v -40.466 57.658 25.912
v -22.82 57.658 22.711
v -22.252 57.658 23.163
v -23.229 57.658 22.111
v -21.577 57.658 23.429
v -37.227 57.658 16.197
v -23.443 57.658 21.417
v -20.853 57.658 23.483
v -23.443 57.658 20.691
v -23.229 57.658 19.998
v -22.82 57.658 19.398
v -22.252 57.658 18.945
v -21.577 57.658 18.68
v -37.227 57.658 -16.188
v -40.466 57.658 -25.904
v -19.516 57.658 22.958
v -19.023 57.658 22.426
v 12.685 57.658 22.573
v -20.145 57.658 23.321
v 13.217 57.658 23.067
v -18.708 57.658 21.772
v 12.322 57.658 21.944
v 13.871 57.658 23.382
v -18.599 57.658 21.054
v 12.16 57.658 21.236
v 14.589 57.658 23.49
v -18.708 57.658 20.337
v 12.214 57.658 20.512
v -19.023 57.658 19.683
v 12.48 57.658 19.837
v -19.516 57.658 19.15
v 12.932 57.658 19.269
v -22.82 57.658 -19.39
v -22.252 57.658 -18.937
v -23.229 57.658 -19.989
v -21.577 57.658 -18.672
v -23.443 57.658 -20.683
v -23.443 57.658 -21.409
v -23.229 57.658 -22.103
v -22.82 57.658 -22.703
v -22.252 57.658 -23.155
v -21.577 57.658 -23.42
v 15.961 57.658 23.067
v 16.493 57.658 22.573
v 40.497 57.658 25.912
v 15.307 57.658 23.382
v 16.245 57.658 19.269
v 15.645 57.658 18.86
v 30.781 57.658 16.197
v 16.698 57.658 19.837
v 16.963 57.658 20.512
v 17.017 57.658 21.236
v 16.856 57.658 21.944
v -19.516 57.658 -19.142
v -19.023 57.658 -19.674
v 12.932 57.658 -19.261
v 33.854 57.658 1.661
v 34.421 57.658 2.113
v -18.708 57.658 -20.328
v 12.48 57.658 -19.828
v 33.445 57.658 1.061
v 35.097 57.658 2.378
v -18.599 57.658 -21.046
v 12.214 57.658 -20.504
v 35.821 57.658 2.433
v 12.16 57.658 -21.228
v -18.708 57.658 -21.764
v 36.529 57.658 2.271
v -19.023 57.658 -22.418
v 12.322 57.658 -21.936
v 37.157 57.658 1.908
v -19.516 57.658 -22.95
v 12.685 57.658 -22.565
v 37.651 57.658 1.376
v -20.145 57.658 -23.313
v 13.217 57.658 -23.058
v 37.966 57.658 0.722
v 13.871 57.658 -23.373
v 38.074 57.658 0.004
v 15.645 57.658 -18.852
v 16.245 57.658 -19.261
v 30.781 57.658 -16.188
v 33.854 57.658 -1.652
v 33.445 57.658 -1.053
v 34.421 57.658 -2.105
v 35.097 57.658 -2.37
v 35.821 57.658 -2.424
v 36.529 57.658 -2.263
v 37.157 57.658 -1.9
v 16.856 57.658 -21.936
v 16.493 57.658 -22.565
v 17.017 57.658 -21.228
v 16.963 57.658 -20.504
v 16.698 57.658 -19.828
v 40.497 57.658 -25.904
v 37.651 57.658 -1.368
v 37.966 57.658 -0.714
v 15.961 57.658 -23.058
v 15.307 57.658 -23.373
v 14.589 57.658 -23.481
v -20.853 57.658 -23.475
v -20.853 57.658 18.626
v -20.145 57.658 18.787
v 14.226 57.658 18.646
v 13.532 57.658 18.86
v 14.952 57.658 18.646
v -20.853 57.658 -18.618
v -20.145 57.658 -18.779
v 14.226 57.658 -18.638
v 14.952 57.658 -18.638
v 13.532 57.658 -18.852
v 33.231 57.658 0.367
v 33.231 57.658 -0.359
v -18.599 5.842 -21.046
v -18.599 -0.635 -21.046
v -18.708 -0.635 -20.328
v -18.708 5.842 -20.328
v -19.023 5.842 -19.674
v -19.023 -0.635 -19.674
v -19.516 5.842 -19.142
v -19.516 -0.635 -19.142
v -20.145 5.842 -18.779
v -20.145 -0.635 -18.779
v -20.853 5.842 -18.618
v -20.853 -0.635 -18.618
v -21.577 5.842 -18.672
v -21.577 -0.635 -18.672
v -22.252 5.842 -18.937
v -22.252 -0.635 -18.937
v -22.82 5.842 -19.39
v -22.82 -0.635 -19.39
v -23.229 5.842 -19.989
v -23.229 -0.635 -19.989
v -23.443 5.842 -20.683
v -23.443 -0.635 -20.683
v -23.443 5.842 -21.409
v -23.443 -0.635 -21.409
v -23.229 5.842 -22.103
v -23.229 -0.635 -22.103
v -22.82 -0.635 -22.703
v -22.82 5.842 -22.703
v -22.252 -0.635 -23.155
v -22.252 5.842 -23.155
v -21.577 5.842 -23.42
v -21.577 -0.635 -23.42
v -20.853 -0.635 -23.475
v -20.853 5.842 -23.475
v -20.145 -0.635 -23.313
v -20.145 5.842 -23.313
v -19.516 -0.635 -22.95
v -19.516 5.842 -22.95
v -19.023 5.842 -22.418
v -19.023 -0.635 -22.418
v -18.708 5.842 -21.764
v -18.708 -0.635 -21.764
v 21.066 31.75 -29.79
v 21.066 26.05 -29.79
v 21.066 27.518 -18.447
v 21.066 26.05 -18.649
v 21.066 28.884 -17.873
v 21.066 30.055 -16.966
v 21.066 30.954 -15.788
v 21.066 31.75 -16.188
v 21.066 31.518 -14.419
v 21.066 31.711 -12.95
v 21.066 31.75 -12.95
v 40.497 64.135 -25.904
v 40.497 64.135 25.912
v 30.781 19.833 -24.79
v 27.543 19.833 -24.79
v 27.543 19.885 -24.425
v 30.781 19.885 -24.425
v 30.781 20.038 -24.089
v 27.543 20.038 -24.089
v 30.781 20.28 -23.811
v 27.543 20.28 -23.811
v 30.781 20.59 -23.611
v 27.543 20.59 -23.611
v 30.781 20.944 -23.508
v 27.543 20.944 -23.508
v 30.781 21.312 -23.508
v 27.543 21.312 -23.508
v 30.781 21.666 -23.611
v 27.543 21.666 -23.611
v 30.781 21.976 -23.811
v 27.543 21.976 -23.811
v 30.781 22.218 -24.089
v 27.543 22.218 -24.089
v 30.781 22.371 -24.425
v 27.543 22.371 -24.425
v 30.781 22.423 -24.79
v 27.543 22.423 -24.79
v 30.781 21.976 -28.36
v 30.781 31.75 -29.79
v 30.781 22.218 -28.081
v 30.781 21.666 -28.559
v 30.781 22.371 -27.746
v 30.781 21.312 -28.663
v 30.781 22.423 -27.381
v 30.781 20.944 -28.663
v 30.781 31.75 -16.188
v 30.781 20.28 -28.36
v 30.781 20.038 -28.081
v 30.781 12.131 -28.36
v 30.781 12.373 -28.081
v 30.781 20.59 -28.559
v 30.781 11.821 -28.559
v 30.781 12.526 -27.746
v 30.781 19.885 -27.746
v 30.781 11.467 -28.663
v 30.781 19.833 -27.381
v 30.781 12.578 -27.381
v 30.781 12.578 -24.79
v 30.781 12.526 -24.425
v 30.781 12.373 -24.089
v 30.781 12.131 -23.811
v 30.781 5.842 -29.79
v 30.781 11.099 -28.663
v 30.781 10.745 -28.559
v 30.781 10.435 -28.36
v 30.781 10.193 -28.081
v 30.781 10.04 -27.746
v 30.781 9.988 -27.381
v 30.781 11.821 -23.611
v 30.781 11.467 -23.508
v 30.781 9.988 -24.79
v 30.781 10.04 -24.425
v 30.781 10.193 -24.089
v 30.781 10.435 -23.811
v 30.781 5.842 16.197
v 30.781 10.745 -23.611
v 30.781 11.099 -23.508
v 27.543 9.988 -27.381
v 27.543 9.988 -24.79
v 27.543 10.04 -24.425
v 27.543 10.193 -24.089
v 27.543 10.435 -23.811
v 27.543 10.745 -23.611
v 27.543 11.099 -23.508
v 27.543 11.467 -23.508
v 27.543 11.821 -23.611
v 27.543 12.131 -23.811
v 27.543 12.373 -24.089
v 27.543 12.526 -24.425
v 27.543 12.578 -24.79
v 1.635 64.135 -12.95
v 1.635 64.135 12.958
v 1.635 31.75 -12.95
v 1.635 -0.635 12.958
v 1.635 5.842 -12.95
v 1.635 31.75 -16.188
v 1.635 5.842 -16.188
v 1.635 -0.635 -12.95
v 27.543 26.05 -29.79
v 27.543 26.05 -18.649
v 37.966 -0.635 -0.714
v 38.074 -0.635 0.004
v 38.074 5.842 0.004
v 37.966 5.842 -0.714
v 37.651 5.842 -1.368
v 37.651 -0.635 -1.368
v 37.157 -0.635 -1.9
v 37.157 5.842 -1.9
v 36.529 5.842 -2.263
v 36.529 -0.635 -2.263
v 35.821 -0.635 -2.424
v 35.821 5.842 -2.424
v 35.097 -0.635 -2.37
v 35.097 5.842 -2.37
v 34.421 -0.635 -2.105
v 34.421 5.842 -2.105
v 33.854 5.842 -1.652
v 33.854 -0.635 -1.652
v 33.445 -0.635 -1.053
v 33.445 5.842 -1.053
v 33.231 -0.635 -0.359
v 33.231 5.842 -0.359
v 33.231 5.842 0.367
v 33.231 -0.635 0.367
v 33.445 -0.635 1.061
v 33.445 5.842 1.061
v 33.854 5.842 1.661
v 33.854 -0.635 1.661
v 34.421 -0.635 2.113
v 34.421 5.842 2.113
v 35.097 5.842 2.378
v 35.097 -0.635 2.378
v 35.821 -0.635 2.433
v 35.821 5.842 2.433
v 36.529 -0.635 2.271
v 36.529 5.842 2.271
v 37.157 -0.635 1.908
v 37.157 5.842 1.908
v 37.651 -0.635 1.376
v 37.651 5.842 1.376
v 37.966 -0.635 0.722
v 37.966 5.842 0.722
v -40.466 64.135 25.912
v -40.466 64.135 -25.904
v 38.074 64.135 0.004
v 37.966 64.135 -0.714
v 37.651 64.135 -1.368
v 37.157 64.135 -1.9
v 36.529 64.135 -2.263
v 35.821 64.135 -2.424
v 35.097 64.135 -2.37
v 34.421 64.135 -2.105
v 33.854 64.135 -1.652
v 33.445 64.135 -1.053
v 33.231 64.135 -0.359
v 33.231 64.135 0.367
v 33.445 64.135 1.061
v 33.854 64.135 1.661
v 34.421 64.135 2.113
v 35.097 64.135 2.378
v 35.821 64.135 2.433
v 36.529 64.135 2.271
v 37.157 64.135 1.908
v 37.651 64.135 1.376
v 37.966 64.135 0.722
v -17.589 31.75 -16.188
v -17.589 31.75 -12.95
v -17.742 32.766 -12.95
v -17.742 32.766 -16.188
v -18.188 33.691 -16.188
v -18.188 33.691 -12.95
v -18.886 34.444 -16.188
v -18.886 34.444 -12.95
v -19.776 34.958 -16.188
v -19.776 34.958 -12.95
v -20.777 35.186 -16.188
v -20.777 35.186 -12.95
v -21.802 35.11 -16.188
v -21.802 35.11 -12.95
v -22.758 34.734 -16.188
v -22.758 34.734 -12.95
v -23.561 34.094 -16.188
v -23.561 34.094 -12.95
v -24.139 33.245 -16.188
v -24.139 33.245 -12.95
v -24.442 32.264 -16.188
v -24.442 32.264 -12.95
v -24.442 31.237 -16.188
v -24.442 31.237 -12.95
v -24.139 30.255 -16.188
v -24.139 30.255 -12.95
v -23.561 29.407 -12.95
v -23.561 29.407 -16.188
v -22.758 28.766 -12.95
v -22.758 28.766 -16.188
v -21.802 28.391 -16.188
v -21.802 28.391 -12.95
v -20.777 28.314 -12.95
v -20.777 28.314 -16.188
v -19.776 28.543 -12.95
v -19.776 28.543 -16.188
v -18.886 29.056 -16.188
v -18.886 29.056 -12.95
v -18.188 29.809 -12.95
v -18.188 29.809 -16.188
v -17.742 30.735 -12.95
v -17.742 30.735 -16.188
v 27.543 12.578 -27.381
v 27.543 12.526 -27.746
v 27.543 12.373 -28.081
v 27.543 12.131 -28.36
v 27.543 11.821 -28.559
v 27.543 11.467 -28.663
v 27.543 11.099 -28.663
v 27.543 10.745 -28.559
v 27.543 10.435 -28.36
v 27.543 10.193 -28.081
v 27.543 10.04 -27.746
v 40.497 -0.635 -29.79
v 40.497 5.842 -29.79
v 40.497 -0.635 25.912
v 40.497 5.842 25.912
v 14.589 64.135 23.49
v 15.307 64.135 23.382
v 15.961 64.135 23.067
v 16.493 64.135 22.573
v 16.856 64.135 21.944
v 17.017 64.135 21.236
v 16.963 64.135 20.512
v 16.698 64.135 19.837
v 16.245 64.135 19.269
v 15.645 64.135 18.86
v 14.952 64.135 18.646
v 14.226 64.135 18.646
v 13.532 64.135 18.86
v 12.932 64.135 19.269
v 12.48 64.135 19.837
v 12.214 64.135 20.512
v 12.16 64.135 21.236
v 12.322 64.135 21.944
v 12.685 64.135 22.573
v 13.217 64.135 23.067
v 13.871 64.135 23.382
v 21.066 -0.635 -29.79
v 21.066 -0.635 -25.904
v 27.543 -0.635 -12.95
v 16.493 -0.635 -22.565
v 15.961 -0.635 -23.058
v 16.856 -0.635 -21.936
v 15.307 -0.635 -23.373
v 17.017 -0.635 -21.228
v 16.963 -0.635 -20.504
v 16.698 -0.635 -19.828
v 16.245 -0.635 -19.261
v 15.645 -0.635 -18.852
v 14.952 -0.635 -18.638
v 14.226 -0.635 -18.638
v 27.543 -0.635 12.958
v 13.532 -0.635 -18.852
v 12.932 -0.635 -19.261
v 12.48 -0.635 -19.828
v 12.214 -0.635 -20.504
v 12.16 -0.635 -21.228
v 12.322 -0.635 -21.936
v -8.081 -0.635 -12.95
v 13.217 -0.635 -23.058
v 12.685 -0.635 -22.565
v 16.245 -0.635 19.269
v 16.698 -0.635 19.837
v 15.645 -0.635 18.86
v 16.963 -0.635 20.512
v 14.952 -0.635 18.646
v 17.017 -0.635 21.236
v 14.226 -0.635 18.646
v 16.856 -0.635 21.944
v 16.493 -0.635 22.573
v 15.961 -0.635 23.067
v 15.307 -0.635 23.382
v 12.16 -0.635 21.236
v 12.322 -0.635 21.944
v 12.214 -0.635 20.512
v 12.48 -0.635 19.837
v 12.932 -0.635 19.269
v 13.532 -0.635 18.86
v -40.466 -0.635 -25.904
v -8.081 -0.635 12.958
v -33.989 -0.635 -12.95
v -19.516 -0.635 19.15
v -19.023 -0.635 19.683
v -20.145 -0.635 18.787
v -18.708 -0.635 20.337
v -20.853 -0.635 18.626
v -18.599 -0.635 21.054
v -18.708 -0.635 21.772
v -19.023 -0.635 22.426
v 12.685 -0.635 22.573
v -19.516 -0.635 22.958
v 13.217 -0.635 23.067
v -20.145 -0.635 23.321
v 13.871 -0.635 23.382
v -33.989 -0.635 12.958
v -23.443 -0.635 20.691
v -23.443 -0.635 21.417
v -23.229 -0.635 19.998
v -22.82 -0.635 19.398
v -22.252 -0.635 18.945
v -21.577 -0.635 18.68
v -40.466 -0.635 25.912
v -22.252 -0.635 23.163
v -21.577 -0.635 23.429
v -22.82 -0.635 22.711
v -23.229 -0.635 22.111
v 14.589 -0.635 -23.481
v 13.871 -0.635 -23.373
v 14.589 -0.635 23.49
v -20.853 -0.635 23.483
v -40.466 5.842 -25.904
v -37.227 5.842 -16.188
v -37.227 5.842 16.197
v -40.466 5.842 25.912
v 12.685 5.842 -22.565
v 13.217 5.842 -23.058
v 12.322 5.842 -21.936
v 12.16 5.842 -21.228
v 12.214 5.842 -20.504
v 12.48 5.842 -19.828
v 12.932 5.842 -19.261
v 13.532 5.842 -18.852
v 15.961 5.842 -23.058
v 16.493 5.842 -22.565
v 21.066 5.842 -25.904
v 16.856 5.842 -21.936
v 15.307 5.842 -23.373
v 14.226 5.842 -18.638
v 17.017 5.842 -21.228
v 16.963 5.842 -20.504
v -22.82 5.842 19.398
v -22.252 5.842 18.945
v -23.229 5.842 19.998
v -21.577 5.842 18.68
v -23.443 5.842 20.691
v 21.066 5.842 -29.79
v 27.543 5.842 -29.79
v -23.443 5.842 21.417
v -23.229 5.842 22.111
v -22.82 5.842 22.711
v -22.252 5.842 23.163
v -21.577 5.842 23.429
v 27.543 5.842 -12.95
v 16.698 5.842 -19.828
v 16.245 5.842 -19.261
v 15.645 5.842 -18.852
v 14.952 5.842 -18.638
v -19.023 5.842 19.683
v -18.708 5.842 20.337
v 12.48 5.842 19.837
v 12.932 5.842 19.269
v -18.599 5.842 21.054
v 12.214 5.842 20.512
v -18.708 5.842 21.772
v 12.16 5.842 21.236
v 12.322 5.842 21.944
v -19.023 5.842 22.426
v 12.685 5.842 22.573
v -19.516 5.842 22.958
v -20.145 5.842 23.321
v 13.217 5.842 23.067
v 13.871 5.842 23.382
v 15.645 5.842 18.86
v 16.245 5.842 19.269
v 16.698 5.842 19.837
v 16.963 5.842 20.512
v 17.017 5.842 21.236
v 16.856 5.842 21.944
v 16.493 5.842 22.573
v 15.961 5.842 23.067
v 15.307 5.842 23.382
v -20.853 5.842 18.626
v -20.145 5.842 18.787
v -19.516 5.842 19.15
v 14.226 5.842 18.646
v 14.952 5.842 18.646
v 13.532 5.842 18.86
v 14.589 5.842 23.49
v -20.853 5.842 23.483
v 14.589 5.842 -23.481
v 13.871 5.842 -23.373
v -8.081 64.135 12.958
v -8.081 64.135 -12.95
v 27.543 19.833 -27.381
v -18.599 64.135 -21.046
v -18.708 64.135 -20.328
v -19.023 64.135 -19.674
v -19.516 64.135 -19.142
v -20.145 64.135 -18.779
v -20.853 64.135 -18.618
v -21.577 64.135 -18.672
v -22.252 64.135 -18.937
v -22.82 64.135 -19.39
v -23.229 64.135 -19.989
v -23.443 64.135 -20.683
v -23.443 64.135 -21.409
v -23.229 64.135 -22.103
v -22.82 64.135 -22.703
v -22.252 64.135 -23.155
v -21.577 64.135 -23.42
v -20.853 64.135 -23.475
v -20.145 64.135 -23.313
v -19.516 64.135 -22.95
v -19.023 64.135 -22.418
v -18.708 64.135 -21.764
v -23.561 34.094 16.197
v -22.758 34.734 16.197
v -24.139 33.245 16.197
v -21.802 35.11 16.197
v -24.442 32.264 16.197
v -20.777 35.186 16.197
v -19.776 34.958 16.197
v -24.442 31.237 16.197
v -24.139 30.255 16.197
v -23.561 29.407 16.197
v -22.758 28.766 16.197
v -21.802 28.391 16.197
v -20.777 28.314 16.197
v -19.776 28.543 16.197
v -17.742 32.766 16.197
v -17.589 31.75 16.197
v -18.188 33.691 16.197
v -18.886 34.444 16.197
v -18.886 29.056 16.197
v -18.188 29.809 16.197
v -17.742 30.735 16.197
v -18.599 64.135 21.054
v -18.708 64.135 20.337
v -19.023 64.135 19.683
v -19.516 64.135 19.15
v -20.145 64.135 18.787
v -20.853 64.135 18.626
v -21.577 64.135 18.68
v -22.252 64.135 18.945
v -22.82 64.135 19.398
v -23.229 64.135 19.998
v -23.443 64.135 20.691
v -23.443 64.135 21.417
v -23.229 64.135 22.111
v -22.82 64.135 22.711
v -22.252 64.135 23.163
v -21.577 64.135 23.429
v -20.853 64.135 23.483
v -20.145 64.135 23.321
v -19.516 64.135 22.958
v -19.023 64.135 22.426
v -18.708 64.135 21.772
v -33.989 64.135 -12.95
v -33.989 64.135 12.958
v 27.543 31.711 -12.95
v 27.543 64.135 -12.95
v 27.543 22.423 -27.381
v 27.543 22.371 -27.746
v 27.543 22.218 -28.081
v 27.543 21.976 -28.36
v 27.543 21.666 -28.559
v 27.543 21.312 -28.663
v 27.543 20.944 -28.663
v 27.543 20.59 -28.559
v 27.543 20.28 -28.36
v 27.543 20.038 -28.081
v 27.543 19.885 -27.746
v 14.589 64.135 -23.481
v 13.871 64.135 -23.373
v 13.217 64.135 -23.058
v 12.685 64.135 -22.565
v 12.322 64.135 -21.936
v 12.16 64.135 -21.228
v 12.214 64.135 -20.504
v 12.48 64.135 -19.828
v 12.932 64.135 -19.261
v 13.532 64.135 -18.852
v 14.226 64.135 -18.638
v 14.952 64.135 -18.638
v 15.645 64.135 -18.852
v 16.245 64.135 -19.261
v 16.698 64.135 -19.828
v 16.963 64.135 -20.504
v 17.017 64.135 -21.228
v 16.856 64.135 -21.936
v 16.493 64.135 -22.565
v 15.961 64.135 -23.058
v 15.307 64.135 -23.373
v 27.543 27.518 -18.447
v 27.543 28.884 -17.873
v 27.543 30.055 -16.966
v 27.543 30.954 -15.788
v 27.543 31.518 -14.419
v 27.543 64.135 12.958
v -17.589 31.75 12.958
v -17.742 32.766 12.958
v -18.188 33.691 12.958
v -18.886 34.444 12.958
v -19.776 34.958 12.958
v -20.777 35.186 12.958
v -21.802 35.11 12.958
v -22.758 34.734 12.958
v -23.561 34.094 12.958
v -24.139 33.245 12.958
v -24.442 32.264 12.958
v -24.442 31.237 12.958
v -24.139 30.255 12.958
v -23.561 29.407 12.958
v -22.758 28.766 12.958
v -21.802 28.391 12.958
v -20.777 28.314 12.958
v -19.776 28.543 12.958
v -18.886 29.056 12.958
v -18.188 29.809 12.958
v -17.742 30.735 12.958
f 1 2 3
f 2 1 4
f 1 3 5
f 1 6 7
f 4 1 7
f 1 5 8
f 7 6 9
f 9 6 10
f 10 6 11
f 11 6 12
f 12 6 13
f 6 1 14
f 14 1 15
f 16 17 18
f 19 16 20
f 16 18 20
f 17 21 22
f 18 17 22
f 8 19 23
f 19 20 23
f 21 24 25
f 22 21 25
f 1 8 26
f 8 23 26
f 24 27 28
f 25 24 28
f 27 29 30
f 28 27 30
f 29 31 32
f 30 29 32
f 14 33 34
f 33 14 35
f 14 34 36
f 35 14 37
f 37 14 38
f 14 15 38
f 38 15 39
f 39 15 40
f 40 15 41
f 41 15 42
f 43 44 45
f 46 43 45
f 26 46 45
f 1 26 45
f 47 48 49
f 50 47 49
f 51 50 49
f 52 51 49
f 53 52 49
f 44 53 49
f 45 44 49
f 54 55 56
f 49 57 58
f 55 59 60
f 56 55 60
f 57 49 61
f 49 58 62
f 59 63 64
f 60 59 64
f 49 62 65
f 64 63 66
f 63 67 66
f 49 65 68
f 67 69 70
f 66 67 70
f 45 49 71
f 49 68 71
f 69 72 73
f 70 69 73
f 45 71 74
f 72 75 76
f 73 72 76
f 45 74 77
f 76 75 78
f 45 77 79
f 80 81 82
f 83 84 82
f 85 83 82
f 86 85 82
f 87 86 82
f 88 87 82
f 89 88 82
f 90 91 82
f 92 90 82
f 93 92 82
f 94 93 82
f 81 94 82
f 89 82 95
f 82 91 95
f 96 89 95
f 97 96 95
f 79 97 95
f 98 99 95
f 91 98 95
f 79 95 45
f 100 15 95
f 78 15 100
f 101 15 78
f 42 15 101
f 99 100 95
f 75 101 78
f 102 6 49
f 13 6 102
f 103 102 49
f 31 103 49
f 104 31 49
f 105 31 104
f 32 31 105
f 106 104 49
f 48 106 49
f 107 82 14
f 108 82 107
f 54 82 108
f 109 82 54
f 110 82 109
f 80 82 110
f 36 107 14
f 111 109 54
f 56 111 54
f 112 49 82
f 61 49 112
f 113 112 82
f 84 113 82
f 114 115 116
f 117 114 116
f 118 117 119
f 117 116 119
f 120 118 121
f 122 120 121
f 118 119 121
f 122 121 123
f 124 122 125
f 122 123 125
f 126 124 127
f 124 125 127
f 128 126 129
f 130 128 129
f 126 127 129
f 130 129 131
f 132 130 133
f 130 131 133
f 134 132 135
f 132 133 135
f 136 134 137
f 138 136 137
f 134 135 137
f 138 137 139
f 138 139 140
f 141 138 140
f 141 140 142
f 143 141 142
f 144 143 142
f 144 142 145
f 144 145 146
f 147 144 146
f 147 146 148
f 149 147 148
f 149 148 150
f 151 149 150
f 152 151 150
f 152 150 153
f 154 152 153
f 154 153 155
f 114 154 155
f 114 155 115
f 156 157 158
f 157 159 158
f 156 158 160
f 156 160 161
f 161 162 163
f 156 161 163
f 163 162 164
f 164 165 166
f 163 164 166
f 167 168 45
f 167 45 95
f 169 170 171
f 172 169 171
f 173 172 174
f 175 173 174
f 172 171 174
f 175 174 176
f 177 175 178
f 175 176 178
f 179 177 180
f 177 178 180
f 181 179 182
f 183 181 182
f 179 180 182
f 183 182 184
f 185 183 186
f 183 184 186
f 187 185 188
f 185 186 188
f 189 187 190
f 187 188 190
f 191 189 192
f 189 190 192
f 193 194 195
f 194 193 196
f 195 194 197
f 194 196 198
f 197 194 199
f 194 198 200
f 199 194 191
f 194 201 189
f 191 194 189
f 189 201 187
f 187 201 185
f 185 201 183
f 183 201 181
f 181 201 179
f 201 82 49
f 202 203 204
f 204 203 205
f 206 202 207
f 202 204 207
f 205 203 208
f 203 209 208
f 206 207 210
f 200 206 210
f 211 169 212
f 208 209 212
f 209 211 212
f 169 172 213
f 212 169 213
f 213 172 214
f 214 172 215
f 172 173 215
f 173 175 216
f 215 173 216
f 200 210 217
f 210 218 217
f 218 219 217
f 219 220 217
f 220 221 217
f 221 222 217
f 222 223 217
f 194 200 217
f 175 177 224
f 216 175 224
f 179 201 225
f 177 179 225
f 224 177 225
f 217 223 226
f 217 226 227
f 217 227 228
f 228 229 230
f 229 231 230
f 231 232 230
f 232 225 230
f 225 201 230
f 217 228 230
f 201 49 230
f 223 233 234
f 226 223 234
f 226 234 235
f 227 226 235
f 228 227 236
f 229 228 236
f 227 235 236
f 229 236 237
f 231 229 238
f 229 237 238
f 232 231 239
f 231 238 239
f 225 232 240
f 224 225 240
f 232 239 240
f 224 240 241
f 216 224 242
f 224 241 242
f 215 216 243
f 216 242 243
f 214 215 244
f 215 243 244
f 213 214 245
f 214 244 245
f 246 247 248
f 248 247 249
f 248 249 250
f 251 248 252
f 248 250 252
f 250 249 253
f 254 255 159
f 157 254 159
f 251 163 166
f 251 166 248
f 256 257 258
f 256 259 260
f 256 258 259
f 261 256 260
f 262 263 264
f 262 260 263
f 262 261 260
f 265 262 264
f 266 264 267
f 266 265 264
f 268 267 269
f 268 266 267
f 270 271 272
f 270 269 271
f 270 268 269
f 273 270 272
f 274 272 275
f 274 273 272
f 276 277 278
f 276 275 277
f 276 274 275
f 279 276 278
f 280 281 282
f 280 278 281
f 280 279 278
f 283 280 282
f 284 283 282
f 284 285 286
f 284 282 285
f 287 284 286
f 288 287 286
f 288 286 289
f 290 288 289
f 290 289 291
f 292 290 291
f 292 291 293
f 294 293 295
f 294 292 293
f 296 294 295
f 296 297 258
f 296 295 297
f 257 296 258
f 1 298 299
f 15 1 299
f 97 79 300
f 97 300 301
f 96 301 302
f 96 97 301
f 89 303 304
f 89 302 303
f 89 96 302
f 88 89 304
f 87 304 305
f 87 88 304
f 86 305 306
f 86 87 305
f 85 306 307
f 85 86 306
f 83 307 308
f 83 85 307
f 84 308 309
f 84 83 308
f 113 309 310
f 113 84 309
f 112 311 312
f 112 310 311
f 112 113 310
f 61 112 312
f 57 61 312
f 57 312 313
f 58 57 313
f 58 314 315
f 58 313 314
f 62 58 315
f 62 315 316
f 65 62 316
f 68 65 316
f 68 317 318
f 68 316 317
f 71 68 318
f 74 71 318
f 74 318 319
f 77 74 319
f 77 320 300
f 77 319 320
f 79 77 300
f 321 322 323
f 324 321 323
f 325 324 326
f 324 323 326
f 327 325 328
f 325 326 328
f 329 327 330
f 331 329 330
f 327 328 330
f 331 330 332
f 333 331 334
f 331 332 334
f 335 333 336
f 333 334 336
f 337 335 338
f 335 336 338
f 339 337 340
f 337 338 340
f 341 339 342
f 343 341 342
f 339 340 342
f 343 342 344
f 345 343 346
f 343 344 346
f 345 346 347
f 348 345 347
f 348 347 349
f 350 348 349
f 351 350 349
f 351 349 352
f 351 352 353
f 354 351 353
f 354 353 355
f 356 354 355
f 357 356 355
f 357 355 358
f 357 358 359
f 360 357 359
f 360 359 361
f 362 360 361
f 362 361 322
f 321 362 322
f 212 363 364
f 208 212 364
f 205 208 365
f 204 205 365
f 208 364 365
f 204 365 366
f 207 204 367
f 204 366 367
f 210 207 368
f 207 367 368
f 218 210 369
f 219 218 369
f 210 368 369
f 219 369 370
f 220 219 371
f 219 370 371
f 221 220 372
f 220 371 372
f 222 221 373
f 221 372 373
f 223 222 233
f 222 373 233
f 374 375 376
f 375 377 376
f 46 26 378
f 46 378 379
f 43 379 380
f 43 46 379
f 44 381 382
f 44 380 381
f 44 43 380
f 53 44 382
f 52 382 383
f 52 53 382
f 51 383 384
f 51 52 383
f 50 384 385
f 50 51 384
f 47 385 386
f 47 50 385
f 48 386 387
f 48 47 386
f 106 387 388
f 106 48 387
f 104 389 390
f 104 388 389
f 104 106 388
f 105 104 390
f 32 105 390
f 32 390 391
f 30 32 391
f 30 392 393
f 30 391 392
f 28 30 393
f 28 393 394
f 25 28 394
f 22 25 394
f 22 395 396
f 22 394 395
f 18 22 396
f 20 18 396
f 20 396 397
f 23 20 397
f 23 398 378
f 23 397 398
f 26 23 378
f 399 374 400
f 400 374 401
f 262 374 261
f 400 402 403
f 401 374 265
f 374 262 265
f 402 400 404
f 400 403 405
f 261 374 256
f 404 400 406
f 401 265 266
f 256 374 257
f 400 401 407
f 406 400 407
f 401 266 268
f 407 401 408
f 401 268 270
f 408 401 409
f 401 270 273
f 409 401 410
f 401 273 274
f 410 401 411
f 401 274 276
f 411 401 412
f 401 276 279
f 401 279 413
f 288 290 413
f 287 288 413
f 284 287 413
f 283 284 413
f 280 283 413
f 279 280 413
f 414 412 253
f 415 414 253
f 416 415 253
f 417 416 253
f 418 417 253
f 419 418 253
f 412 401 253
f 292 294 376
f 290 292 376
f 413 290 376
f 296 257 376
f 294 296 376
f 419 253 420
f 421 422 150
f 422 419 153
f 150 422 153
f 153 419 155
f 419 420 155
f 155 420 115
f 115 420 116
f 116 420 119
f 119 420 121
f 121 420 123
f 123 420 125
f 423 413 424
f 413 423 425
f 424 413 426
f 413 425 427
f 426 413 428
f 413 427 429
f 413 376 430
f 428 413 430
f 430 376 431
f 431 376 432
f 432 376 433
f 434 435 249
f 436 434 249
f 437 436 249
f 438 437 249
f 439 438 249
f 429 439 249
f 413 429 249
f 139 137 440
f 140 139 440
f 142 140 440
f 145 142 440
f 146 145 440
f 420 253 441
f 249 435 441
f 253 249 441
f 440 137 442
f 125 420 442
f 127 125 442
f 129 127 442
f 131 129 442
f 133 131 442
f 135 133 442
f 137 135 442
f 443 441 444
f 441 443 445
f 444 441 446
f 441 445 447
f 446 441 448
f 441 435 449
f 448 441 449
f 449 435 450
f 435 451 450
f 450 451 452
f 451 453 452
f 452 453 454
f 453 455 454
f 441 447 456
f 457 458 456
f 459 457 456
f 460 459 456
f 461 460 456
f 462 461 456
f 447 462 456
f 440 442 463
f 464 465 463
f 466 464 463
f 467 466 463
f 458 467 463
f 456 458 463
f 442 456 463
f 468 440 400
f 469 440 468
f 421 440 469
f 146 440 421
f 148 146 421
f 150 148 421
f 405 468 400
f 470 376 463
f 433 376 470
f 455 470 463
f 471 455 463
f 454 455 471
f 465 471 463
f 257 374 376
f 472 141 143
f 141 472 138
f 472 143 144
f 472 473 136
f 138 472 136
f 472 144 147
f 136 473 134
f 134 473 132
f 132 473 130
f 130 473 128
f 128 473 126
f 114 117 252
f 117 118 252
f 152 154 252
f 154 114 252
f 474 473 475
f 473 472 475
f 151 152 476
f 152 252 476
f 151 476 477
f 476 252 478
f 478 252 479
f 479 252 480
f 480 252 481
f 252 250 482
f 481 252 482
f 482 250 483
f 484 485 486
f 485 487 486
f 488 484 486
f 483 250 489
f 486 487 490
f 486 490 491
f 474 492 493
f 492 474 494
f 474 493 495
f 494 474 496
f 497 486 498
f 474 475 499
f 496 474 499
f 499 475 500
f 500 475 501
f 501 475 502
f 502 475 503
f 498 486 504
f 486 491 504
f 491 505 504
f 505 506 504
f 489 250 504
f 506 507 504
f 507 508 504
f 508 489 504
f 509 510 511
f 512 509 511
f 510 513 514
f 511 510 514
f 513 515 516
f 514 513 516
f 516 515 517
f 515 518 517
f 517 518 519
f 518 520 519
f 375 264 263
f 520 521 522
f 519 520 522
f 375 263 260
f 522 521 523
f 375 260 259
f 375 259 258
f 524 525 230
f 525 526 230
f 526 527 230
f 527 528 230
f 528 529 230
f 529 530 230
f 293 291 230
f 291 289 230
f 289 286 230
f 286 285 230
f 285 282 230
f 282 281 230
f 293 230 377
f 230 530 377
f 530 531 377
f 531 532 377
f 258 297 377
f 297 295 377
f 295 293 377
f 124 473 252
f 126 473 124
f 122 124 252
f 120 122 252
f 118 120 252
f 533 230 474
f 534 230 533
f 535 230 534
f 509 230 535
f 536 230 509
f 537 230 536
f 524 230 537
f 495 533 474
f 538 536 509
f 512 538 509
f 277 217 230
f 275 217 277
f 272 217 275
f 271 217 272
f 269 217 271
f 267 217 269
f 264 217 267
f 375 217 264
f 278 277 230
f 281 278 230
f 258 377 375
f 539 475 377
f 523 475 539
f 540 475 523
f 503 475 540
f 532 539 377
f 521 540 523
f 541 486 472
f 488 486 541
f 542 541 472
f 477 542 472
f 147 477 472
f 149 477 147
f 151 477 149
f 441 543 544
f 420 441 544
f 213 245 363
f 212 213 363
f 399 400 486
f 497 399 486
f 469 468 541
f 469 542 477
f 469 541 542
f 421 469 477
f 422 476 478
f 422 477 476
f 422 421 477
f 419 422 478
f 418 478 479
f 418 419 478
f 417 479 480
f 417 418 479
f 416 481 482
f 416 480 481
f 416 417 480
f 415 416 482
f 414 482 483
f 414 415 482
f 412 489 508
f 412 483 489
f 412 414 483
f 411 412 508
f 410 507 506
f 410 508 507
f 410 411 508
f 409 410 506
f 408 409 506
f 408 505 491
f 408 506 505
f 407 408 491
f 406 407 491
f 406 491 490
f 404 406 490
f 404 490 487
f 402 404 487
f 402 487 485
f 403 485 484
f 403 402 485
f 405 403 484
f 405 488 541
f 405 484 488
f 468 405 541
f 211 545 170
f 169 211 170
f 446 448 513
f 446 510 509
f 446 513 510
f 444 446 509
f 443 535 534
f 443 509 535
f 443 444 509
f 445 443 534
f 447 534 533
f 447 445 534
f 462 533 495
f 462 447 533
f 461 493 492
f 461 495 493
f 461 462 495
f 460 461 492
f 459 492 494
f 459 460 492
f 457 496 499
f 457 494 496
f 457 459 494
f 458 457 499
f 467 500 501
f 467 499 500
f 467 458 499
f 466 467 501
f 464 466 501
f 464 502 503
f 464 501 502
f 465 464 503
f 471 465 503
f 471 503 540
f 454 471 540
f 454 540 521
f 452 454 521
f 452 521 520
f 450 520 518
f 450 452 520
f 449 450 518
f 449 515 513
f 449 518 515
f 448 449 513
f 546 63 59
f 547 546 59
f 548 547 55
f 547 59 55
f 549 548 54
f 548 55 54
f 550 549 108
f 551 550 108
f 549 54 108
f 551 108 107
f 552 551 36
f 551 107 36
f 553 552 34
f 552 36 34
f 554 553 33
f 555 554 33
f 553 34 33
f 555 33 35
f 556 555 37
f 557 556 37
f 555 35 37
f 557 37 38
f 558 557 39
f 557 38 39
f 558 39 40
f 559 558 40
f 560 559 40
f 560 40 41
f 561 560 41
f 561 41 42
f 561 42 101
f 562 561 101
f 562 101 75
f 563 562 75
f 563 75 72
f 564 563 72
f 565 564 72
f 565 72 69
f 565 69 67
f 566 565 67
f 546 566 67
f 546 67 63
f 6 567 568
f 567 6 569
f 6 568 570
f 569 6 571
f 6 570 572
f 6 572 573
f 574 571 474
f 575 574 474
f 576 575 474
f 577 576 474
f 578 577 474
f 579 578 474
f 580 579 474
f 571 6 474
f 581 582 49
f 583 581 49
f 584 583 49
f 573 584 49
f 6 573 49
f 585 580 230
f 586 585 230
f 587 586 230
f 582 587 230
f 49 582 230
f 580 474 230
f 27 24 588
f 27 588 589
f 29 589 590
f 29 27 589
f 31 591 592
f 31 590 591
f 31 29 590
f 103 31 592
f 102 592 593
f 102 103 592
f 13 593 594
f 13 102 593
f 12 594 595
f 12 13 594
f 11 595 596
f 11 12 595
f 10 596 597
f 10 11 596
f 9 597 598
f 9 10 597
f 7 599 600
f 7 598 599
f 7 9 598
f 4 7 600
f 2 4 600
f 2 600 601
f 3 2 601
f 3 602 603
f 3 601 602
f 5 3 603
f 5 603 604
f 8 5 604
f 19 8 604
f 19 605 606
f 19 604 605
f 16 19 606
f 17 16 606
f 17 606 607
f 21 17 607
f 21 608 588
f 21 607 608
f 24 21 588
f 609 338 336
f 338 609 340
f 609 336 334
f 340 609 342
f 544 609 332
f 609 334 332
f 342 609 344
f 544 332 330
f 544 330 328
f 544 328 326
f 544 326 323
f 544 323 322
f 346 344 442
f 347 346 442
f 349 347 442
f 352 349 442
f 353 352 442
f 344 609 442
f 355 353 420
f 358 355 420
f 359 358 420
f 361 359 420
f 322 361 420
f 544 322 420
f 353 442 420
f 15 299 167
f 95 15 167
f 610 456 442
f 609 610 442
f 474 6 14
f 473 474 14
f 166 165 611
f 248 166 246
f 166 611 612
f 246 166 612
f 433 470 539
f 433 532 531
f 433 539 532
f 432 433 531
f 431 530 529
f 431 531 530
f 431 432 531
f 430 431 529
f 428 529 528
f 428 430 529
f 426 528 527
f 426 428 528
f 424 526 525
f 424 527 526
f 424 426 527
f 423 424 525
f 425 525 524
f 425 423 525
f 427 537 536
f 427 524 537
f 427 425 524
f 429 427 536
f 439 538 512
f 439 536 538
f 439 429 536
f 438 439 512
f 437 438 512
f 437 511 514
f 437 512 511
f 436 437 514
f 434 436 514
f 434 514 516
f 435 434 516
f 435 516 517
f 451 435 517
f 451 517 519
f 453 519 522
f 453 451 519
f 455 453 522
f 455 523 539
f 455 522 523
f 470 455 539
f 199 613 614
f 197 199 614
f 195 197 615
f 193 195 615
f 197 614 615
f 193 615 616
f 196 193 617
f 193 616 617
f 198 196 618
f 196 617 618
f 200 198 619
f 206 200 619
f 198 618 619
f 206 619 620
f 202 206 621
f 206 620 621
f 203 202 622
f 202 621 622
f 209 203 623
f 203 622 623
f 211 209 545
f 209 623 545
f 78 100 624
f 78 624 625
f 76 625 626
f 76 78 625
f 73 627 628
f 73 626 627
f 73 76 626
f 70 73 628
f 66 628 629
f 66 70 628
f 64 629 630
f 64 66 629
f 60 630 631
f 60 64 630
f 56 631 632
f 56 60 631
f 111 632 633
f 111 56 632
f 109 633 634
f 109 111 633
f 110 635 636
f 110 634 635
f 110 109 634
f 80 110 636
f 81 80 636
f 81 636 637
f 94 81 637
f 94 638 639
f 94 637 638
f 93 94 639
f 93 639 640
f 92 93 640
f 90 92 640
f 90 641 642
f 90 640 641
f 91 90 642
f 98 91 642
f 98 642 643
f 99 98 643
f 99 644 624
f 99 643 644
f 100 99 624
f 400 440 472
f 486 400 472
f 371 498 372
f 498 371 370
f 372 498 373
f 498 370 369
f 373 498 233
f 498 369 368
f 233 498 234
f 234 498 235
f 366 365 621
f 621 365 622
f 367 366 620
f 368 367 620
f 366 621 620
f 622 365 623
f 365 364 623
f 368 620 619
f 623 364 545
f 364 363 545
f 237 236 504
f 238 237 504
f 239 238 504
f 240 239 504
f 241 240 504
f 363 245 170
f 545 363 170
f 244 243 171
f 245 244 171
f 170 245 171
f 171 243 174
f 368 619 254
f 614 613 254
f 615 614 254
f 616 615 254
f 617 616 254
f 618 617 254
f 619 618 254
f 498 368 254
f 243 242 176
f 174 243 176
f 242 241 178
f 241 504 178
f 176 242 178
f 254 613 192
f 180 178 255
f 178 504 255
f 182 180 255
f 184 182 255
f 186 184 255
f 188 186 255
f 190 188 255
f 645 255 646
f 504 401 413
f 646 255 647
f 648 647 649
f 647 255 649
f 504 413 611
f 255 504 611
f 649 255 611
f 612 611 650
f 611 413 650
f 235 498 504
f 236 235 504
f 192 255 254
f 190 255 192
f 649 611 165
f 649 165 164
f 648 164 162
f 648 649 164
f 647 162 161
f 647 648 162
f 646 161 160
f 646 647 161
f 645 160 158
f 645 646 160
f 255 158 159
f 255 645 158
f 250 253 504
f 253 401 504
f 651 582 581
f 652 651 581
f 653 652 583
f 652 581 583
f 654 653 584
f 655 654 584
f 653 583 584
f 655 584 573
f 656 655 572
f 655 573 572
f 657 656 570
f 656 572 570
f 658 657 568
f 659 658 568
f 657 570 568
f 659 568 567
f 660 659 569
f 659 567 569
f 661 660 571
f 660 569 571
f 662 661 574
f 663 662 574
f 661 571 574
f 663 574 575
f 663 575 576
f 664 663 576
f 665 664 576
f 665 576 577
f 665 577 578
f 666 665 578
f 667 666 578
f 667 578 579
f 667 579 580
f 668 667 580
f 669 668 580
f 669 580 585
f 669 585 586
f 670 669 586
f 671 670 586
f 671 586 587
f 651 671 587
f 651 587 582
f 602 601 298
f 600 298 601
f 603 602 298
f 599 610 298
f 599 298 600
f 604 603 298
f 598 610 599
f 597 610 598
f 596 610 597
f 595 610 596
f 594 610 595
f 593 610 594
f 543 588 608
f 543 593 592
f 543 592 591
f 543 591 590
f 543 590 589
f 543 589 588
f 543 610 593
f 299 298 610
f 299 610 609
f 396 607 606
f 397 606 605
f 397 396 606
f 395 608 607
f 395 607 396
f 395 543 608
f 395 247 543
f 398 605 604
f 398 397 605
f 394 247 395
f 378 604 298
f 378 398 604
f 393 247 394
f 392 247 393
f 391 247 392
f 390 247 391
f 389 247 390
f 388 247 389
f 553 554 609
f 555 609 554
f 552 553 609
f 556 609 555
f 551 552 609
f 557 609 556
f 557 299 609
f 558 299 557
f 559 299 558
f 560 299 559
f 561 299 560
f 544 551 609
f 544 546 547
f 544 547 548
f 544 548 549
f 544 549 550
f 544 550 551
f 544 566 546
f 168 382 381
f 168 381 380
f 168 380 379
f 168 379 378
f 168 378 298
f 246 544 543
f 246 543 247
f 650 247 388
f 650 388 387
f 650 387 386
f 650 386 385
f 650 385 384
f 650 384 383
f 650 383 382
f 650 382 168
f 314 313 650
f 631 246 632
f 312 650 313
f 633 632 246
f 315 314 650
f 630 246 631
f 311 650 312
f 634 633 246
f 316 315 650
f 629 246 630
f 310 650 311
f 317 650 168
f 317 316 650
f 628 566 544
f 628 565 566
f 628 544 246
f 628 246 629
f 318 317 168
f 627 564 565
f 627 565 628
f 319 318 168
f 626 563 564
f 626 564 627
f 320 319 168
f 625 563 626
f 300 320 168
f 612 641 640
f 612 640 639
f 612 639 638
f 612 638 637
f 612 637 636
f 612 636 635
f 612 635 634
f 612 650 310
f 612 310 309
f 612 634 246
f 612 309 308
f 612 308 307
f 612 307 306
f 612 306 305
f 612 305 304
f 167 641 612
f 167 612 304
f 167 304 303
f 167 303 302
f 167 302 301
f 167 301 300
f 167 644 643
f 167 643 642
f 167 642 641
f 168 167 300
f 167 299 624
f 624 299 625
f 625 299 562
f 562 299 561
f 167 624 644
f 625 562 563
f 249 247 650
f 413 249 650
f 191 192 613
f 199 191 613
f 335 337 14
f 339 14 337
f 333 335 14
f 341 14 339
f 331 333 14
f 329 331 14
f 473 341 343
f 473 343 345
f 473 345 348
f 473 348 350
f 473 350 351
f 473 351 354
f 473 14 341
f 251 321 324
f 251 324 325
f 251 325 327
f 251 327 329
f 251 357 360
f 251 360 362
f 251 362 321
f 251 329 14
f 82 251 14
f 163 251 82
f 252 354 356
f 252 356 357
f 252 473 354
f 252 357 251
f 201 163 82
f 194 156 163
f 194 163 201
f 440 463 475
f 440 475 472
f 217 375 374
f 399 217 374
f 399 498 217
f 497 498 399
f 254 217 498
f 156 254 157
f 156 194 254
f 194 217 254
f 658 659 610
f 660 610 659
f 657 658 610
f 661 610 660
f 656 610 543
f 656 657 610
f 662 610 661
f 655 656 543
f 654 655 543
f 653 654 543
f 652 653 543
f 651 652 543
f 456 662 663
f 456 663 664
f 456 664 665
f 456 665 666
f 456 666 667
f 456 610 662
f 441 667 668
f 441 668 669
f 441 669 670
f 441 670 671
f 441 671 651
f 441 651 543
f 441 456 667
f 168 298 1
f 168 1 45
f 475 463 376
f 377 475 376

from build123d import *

# Parameters (mm, degrees)
SKETCH2_W               = 79.375
SKETCH2_H               = 50.8
BOSS_EXTRUDE1_DEPTH     = 6.35
SKETCH3_W               = 66.675
SKETCH3_H               = 31.75
SKETCH3_W_2             = 25.4
SKETCH3_H_2             = 25.4
BOSS_EXTRUDE3_DEPTH     = 50.8
SKETCH4_W               = 25.4
SKETCH4_H               = 25.4
CUT_EXTRUDE4_DEPTH      = 7.35
CUT_EXTRUDE4_DEPTH_BACK = 58.15
SKETCH5_R               = 3.3782
CUT_EXTRUDE5_DEPTH      = 42.275
CUT_EXTRUDE6_START      = -7.35
SKETCH6_R               = 2.3876
CUT_EXTRUDE6_DEPTH      = 65.5
CIRPATTERN1_COUNT       = 4
CUT_EXTRUDE7_START      = -7.35
SKETCH7_R               = 2.3876
CUT_EXTRUDE7_DEPTH      = 65.5
CUT_EXTRUDE8_REACH      = 43.275
SKETCH9_W               = 22.225
SKETCH9_H               = 25.4
SKETCH12_W              = 12.7
SKETCH12_H              = 25.4
BOSS_EXTRUDE5_DEPTH     = 9.525
SKETCH14_W              = 12.7
SKETCH14_H              = 19.812
CUT_EXTRUDE9_DEPTH      = 6.35
SKETCH17_R              = 5.588
CUT_EXTRUDE11_DEPTH     = 6.985
BOSS_EXTRUDE6_DEPTH     = 3.81
CUT_EXTRUDE10_REACH     = 14.7
SKETCH15_R              = 1.27
SCALE1_SCALE            = 1.02


with BuildPart() as part:
    # Sketch2 → Boss-Extrude1 (new body)
    with BuildSketch(Plane(origin=(0, 0, 0), x_dir=(1, 0, 0), z_dir=(0, 1, 0))):
        Rectangle(SKETCH2_W, SKETCH2_H)
    boss_extrude1 = extrude(amount=BOSS_EXTRUDE1_DEPTH)

    # Sketch3 → Boss-Extrude3 (add)
    with BuildSketch(Plane(origin=(0, 6.35, 0), x_dir=(1, 0, 0), z_dir=(0, 1, 0))):
        with Locations((-3.175, 0)):
            Rectangle(SKETCH3_W, SKETCH3_H)
        with Locations((-20.6375, 0)):
            Rectangle(SKETCH3_W_2, SKETCH3_H_2, mode=Mode.SUBTRACT)
        with Locations((14.2875, 0)):
            Rectangle(SKETCH3_W_2, SKETCH3_H_2, mode=Mode.SUBTRACT)
    extrude(amount=BOSS_EXTRUDE3_DEPTH)

    # Mirror1: Boss-Extrude1 across plane
    add(boss_extrude1.mirror(Plane.ZX.offset(31.75)))

    # Sketch4 → Cut-Extrude4 (cut, two sides)
    with BuildSketch(Plane(origin=(0, 57.15, 0), x_dir=(1, 0, 0), z_dir=(0, 1, 0))) as cut_extrude4_sk:
        with Locations((-20.6375, 0)):
            Rectangle(SKETCH4_W, SKETCH4_H)
        with Locations((14.2875, 0)):
            Rectangle(SKETCH4_W, SKETCH4_H)
    extrude(amount=CUT_EXTRUDE4_DEPTH, mode=Mode.SUBTRACT)
    extrude(cut_extrude4_sk.sketch, amount=-CUT_EXTRUDE4_DEPTH_BACK, mode=Mode.SUBTRACT)

    # Sketch5 → Cut-Extrude5 (cut, through all)
    with BuildSketch(Plane.XY.offset(15.875)):
        with Locations((-20.6375, 31.75)):
            Circle(SKETCH5_R)
    extrude(amount=-CUT_EXTRUDE5_DEPTH, mode=Mode.SUBTRACT)

    # Sketch6 → Cut-Extrude6 (cut)
    with BuildSketch(Plane(origin=(0, 6.35, 0), x_dir=(1, 0, 0), z_dir=(0, 1, 0)).offset(CUT_EXTRUDE6_START)):
        with Locations((34.925, 0)):
            Circle(SKETCH6_R)
    cut_extrude6 = extrude(amount=CUT_EXTRUDE6_DEPTH, mode=Mode.SUBTRACT)

    # CirPattern1: Cut-Extrude6 ×4 about axis, 1 skipped
    cirpattern1_axis = Axis((14.2875, 0, 0), (0, 1, 0))
    add([cut_extrude6.rotate(cirpattern1_axis, i * 360 / CIRPATTERN1_COUNT) for i in range(1, CIRPATTERN1_COUNT) if i not in (2,)], mode=Mode.SUBTRACT)

    # Sketch7 → Cut-Extrude7 (cut)
    with BuildSketch(Plane(origin=(0, 6.35, 0), x_dir=(1, 0, 0), z_dir=(0, 1, 0)).offset(CUT_EXTRUDE7_START)):
        with Locations((-20.6375, -20.6375)):
            Circle(SKETCH7_R)
    cut_extrude7 = extrude(amount=CUT_EXTRUDE7_DEPTH, mode=Mode.SUBTRACT)

    # Mirror2: Cut-Extrude7 across plane
    add(cut_extrude7.mirror(Plane.XY), mode=Mode.SUBTRACT)

    # Sketch9 → Cut-Extrude8 (cut, up to next)
    with BuildSketch(Plane(origin=(0, 0, -15.875), x_dir=(-1, 0, 0), z_dir=(0, 0, -1)), mode=Mode.PRIVATE) as cut_extrude8_sk1:
        with Locations((-12.7, 19.05)):
            Rectangle(SKETCH9_W, SKETCH9_H)
    cut_extrude8_tool1 = extrude(cut_extrude8_sk1.sketch, amount=-CUT_EXTRUDE8_REACH, mode=Mode.PRIVATE) & part.part
    add(cut_extrude8_tool1.solids().sort_by_distance((12.7, 19.05, -15.875))[0], mode=Mode.SUBTRACT)

    # Sketch12 → Boss-Extrude5 (add)
    with BuildSketch(Plane(origin=(30.1625, 0, 0), x_dir=(0, 0, -1), z_dir=(1, 0, 0))):
        with Locations((19.05, 19.05)):
            Rectangle(SKETCH12_W, SKETCH12_H)
    extrude(amount=-BOSS_EXTRUDE5_DEPTH)

    # Sketch14 → Cut-Extrude9 (cut)
    with BuildSketch(Plane.ZY.offset(-20.6375)):
        with Locations((-19.05, 16.256)):
            Rectangle(SKETCH14_W, SKETCH14_H)
    extrude(amount=-CUT_EXTRUDE9_DEPTH, mode=Mode.SUBTRACT)

    # Sketch17 → Cut-Extrude11 (cut)
    with BuildSketch(Plane.ZY.offset(-26.9875)):
        with Locations((-12.7, 26.123322238)):
            Circle(SKETCH17_R)
    extrude(amount=CUT_EXTRUDE11_DEPTH, mode=Mode.SUBTRACT)

    # Sketch19 → Boss-Extrude6 (add)
    with BuildSketch(Plane(origin=(0, 0, -25.4), x_dir=(-1, 0, 0), z_dir=(0, 0, -1))):
        Polygon((-26.9875, 26.162), (-20.6375, 26.162), (-20.6375, 31.75), (-30.1625, 31.75), (-30.1625, 6.35), (-39.6875, 6.35), (-39.6875, 0), (-20.6375, 0), (-20.6375, 6.35), (-26.9875, 6.35), align=None)
    extrude(amount=BOSS_EXTRUDE6_DEPTH)

    # Sketch15 → Cut-Extrude10 (cut, up to next)
    with BuildSketch(Plane.ZY.offset(-26.9875), mode=Mode.PRIVATE) as cut_extrude10_sk1:
        with BuildLine():
            Line((-24.3078, 12.954), (-25.5778, 12.954))
            ThreePointArc((-25.5778, 12.954), (-24.679774388, 12.582025612), (-24.3078, 11.684))
            ThreePointArc((-24.3078, 11.684), (-24.679774388, 10.785974388), (-25.5778, 10.414))
            Line((-25.5778, 10.414), (-24.3078, 10.414))
            ThreePointArc((-24.3078, 10.414), (-23.0378, 11.684), (-24.3078, 12.954))
        make_face()
    cut_extrude10_tool1 = extrude(cut_extrude10_sk1.sketch, amount=-CUT_EXTRUDE10_REACH, mode=Mode.PRIVATE) & part.part
    add(cut_extrude10_tool1.solids().sort_by_distance((26.9875, 11.684, -23.945344))[0], mode=Mode.SUBTRACT)
    # Sketch15 → Cut-Extrude10 (cut, up to next)
    with BuildSketch(Plane.ZY.offset(-26.9875), mode=Mode.PRIVATE) as cut_extrude10_sk2:
        with BuildLine():
            Line((-25.5778, 12.954), (-26.8478, 12.954))
            ThreePointArc((-26.8478, 12.954), (-28.1178, 11.684), (-26.8478, 10.414))
            Line((-26.8478, 10.414), (-25.5778, 10.414))
            ThreePointArc((-25.5778, 10.414), (-26.8478, 11.684), (-25.5778, 12.954))
        make_face()
    cut_extrude10_tool2 = extrude(cut_extrude10_sk2.sketch, amount=-CUT_EXTRUDE10_REACH, mode=Mode.PRIVATE) & part.part
    add(cut_extrude10_tool2.solids().sort_by_distance((26.9875, 11.684, -27.210256))[0], mode=Mode.SUBTRACT)
    # Sketch15 → Cut-Extrude10 (cut, up to next)
    with BuildSketch(Plane.ZY.offset(-26.9875), mode=Mode.PRIVATE) as cut_extrude10_sk3:
        with Locations((-25.5778, 11.684)):
            Circle(SKETCH15_R)
    cut_extrude10_tool3 = extrude(cut_extrude10_sk3.sketch, amount=-CUT_EXTRUDE10_REACH, mode=Mode.PRIVATE) & part.part
    add(cut_extrude10_tool3.solids().sort_by_distance((26.9875, 11.684, -25.5778))[0], mode=Mode.SUBTRACT)
    # Sketch15 → Cut-Extrude10 (cut, up to next)
    with BuildSketch(Plane.ZY.offset(-26.9875), mode=Mode.PRIVATE) as cut_extrude10_sk4:
        with BuildLine():
            Line((-24.3078, 22.606), (-25.5778, 22.606))
            ThreePointArc((-25.5778, 22.606), (-24.679774388, 22.234025612), (-24.3078, 21.336))
            ThreePointArc((-24.3078, 21.336), (-24.679774388, 20.437974388), (-25.5778, 20.066))
            Line((-25.5778, 20.066), (-24.3078, 20.066))
            ThreePointArc((-24.3078, 20.066), (-23.0378, 21.336), (-24.3078, 22.606))
        make_face()
    cut_extrude10_tool4 = extrude(cut_extrude10_sk4.sketch, amount=-CUT_EXTRUDE10_REACH, mode=Mode.PRIVATE) & part.part
    add(cut_extrude10_tool4.solids().sort_by_distance((26.9875, 21.336, -23.945344))[0], mode=Mode.SUBTRACT)
    # Sketch15 → Cut-Extrude10 (cut, up to next)
    with BuildSketch(Plane.ZY.offset(-26.9875), mode=Mode.PRIVATE) as cut_extrude10_sk5:
        with Locations((-25.5778, 21.336)):
            Circle(SKETCH15_R)
    cut_extrude10_tool5 = extrude(cut_extrude10_sk5.sketch, amount=-CUT_EXTRUDE10_REACH, mode=Mode.PRIVATE) & part.part
    add(cut_extrude10_tool5.solids().sort_by_distance((26.9875, 21.336, -25.5778))[0], mode=Mode.SUBTRACT)
    # Sketch15 → Cut-Extrude10 (cut, up to next)
    with BuildSketch(Plane.ZY.offset(-26.9875), mode=Mode.PRIVATE) as cut_extrude10_sk6:
        with BuildLine():
            Line((-25.5778, 22.606), (-26.8478, 22.606))
            ThreePointArc((-26.8478, 22.606), (-28.1178, 21.336), (-26.8478, 20.066))
            Line((-26.8478, 20.066), (-25.5778, 20.066))
            ThreePointArc((-25.5778, 20.066), (-26.8478, 21.336), (-25.5778, 22.606))
        make_face()
    cut_extrude10_tool6 = extrude(cut_extrude10_sk6.sketch, amount=-CUT_EXTRUDE10_REACH, mode=Mode.PRIVATE) & part.part
    add(cut_extrude10_tool6.solids().sort_by_distance((26.9875, 21.336, -27.210256))[0], mode=Mode.SUBTRACT)


with BuildPart() as part_1:
    # Scale1: scaled about (-0.77165693, 31.73889904, -0.207713898)
    add(part.part.scale(SCALE1_SCALE).moved(Location((0.015433139, -0.634777981, 0.004154278))))


solid = part_1.part
